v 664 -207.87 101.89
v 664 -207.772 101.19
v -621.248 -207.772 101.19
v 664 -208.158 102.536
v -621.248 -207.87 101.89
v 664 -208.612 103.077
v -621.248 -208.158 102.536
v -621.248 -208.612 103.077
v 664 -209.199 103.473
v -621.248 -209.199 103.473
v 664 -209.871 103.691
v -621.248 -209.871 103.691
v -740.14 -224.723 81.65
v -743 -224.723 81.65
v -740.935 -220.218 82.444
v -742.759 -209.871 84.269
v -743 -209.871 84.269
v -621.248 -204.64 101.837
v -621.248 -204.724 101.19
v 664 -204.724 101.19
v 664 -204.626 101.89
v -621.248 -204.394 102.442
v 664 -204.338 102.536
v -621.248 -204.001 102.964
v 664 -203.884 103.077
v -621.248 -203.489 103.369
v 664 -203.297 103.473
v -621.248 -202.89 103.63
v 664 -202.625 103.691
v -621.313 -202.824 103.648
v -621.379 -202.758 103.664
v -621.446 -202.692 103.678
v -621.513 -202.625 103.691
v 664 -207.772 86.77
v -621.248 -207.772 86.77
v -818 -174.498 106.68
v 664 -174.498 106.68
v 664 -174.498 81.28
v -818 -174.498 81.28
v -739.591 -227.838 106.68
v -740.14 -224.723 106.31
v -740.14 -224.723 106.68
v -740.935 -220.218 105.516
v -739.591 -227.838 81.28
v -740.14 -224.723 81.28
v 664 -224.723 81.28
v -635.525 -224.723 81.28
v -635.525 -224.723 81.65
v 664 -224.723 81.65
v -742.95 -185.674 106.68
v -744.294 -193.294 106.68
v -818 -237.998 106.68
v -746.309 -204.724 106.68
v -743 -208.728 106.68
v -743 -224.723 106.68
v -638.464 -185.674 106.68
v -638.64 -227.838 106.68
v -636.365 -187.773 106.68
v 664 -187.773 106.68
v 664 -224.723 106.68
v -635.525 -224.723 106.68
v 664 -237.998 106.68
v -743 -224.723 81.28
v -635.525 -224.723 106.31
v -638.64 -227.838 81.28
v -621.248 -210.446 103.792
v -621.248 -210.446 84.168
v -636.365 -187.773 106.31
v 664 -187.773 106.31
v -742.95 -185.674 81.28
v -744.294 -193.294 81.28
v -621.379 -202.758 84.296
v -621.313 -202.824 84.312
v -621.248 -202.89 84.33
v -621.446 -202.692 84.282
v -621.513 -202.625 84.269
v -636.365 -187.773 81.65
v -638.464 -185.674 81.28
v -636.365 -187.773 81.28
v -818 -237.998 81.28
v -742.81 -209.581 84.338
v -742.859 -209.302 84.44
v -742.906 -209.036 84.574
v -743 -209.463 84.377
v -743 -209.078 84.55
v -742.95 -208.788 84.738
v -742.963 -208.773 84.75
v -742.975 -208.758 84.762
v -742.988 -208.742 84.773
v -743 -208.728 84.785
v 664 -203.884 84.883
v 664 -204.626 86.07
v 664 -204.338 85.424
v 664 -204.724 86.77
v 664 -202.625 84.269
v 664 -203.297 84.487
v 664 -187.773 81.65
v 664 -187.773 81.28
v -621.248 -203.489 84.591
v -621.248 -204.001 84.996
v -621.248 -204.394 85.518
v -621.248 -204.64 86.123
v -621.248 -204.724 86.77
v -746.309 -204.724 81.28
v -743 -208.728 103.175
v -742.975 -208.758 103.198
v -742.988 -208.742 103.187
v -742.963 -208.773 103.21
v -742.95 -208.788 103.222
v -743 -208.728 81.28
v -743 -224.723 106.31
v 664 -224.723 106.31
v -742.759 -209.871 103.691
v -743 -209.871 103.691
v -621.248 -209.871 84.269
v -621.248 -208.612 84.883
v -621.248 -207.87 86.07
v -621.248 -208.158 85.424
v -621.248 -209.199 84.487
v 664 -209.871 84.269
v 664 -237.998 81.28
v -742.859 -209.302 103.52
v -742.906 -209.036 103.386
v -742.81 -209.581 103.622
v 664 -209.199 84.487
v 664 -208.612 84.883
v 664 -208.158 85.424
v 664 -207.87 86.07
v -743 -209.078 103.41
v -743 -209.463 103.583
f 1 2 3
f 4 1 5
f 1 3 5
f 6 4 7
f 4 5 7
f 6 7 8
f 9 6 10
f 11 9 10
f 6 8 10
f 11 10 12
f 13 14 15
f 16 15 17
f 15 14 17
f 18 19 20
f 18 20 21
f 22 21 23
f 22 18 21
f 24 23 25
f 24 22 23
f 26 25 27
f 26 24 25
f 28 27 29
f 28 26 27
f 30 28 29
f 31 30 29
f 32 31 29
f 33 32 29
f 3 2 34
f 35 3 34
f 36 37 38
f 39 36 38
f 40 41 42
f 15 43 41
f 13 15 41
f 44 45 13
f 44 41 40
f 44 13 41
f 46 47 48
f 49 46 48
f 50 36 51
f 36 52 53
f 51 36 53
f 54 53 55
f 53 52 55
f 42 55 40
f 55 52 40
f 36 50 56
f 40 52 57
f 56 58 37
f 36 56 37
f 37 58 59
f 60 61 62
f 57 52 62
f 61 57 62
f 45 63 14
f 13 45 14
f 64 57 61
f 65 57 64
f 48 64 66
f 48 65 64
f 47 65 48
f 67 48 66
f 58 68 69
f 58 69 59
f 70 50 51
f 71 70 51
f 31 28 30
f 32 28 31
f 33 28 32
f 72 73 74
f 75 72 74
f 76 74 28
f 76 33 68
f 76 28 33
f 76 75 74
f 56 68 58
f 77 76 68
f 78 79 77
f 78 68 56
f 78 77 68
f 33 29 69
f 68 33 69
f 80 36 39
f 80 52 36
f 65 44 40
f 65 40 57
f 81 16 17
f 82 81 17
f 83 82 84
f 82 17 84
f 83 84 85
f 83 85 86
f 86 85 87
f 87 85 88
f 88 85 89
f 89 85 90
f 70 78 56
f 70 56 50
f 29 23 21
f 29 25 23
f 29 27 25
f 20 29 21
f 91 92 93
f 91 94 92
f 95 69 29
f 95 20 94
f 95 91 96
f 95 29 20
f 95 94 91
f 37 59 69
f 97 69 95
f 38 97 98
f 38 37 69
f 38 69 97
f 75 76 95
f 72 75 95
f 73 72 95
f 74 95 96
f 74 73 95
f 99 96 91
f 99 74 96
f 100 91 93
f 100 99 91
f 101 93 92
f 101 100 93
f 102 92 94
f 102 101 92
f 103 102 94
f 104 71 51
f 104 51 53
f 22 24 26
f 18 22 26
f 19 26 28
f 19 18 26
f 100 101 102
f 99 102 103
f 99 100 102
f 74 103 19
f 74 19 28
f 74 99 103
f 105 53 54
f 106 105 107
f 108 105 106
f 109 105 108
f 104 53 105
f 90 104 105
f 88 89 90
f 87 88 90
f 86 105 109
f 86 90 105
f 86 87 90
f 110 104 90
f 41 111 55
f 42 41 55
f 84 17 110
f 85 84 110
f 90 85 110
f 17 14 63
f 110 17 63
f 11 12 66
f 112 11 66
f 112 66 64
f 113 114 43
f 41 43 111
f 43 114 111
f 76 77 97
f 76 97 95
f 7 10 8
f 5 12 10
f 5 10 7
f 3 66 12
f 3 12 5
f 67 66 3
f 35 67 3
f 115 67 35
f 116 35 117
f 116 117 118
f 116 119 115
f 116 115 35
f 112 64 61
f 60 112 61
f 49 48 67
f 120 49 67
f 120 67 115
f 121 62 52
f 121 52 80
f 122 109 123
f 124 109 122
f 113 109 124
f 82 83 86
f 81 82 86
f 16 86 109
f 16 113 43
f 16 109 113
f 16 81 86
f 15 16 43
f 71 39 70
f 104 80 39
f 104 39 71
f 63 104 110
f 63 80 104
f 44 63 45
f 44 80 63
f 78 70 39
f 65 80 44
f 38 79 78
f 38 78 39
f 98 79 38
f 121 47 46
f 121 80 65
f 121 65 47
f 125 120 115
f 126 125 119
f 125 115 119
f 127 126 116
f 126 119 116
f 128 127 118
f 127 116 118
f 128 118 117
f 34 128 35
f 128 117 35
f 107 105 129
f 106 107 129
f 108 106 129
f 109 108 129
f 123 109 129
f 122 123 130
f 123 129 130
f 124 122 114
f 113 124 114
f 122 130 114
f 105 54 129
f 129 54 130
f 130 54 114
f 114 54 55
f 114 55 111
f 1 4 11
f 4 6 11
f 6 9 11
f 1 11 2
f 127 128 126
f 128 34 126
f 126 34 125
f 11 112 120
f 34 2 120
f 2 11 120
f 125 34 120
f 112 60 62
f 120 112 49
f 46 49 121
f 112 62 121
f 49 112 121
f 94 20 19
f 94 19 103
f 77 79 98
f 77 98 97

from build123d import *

# Parameters (mm, degrees)
EXTRUDE_THIN3_DEPTH      = 664
EXTRUDE_THIN3_DEPTH_BACK = 818
SKETCH1_W                = 25.4
SKETCH1_H                = 30.226
CUT_EXTRUDE1_DEPTH       = 674
CUT_EXTRUDE1_DEPTH_BACK  = 743
SKETCH4_W                = 80
SKETCH4_H                = 25.4
BOSS_EXTRUDE1_DEPTH      = 3.048
CUT_EXTRUDE2_DEPTH       = 178


with BuildPart() as part:
    # Sketch1 → Extrude-Thin3 (new, two sides: drawn at the far end of the back side and taken through both)
    with BuildSketch(Plane(origin=(0, 0, 0), x_dir=(0, 0, -1), z_dir=(1, 0, 0)).offset(-EXTRUDE_THIN3_DEPTH_BACK)):
        with Locations((-93.98, -189.611)):
            Rectangle(SKETCH1_W, SKETCH1_H)
    extrude(amount=EXTRUDE_THIN3_DEPTH + EXTRUDE_THIN3_DEPTH_BACK)

    # Sketch3 → Cut-Extrude1 (cut, two sides: drawn at the far end of the back side and taken through both)
    with BuildSketch(Plane(origin=(0, 0, 0), x_dir=(0, 0, -1), z_dir=(1, 0, 0)).offset(-CUT_EXTRUDE1_DEPTH_BACK)):
        with BuildLine():
            Line((-81.650098629, -187.772933629), (-84.268930353, -202.625066371))
            ThreePointArc((-84.268930353, -202.625066371), (-85.137661517, -204.129752886), (-86.770342046, -204.724))
            Line((-86.770342046, -204.724), (-101.189657954, -204.724))
            ThreePointArc((-101.189657954, -204.724), (-102.822338483, -204.129752886), (-103.691069647, -202.625066371))
            Line((-103.691069647, -202.625066371), (-106.309901371, -187.772933629))
            Line((-106.309901371, -187.772933629), (-112.090636736, -187.772933629))
            Line((-112.090636736, -187.772933629), (-112.090636736, -212.168156894))
            Line((-112.090636736, -212.168156894), (-76.546243061, -212.168156894))
            Line((-76.546243061, -212.168156894), (-76.546243061, -187.772933629))
            Line((-76.546243061, -187.772933629), (-81.650098629, -187.772933629))
        make_face()
    extrude(amount=CUT_EXTRUDE1_DEPTH + CUT_EXTRUDE1_DEPTH_BACK, mode=Mode.SUBTRACT)


with BuildPart() as body_2:
    # Mirror3: mirrored copy
    add(part.part.mirror(Plane.ZX.offset(-206.248)))


with BuildPart() as part_1:
    add(part.part)

    add(body_2.part)  # Boss-Extrude1 merges body 2
    # Sketch4 → Boss-Extrude1 (add)
    with BuildSketch(Plane(origin=(0, -207.772, 0), x_dir=(1, 0, 0), z_dir=(0, 1, 0))):
        with Locations((-778, -93.98)):
            Rectangle(SKETCH4_W, SKETCH4_H)
    extrude(amount=BOSS_EXTRUDE1_DEPTH)

    # Sketch6 → Cut-Extrude2 (cut)
    with BuildSketch(Plane.XY):
        Polygon((-638.463603746, -185.674), (-742.95, -185.674), (-744.293611593, -193.294), (-746.309028982, -204.724), (-742.95, -208.788), (-740.934582611, -220.218), (-739.590971018, -227.838), (-638.640030294, -227.838), (-621.247897552, -210.445867257), (-621.247897552, -202.889706194), align=None)
    extrude(amount=CUT_EXTRUDE2_DEPTH, mode=Mode.SUBTRACT)


solid = part_1.part
